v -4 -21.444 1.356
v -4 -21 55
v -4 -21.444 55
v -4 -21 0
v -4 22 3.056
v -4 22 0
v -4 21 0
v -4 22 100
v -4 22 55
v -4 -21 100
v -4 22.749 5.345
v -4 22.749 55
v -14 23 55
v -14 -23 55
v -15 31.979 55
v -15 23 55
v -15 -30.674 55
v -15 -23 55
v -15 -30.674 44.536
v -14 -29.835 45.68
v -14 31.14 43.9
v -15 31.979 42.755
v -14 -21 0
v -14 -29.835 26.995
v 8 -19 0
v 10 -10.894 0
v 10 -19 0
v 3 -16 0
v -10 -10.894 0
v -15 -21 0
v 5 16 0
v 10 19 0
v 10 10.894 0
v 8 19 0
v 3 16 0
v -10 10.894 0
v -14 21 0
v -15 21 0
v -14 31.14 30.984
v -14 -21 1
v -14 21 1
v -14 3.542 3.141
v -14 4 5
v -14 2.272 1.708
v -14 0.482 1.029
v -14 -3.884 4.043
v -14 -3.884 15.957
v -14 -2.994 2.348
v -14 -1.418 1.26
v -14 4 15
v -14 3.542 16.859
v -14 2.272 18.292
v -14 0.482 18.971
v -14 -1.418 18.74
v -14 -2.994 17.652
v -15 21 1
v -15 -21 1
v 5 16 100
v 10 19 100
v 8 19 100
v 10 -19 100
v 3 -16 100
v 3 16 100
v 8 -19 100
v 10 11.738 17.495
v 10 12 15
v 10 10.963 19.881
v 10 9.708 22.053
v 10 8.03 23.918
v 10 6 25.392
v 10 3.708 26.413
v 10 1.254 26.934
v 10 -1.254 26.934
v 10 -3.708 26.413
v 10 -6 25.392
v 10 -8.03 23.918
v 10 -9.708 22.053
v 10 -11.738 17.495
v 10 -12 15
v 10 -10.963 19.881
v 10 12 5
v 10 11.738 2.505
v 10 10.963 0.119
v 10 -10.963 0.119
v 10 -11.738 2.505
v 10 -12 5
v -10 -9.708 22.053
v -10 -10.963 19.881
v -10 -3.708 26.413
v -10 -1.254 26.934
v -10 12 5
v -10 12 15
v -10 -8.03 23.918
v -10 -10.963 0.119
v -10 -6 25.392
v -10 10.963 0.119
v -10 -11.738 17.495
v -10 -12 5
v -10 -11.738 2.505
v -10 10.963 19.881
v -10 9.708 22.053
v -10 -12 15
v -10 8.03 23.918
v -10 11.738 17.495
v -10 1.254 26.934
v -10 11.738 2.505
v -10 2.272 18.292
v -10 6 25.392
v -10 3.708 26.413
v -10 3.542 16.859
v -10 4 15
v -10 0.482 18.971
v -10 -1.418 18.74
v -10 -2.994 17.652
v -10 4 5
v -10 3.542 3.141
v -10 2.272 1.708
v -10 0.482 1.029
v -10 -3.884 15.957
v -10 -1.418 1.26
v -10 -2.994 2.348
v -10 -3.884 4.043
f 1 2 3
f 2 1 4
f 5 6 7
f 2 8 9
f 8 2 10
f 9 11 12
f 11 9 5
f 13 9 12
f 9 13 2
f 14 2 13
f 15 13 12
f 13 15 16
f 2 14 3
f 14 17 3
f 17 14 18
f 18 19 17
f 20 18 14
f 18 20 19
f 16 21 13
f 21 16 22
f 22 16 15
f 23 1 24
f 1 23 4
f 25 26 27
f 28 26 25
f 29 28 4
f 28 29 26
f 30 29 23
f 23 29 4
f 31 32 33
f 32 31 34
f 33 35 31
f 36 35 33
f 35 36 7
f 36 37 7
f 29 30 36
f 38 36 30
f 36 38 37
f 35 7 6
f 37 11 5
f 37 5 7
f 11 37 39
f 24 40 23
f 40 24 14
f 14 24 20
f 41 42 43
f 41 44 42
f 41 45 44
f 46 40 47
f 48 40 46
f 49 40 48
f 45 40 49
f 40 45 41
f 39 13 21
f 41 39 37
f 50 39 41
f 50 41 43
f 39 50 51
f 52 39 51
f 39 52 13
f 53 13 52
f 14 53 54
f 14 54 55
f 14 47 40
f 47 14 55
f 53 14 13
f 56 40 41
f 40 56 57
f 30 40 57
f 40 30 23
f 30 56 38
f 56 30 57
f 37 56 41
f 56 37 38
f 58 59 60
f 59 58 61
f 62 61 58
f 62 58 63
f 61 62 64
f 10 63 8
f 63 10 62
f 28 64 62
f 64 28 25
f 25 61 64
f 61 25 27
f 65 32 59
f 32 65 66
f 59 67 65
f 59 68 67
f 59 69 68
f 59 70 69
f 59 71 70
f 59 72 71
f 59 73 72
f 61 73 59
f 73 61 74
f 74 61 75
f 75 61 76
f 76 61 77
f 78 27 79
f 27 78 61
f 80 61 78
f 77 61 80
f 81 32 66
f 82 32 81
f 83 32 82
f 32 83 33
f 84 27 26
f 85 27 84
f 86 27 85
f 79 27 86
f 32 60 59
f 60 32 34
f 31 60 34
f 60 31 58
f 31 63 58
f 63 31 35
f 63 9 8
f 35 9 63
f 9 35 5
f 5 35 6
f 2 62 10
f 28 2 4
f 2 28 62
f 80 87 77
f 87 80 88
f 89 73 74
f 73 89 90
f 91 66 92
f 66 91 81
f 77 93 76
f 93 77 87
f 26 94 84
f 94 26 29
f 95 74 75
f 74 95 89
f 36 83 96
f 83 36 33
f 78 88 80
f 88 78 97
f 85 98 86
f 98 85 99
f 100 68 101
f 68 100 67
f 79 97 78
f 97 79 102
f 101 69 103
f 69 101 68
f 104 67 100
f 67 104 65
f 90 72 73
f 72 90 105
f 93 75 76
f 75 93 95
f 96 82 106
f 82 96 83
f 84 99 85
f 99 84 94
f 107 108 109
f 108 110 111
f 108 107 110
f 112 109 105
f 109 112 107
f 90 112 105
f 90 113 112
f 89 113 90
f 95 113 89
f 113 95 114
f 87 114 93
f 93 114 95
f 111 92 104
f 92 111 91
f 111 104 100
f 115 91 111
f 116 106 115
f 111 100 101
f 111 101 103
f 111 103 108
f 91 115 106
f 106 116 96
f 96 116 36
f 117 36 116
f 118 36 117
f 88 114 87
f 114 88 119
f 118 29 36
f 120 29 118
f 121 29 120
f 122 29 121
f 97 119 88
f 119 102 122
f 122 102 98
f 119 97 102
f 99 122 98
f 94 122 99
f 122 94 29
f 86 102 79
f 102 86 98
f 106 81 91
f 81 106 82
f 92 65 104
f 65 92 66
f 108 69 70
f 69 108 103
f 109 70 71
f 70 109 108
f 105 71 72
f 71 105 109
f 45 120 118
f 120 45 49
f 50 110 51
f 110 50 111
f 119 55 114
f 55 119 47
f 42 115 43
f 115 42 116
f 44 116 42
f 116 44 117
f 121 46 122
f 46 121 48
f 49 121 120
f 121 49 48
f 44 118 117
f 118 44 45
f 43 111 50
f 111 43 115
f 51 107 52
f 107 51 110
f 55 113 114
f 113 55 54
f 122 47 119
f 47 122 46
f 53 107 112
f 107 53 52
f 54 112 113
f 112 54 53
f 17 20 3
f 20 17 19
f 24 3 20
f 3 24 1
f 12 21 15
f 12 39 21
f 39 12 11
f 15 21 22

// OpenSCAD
arca =[[35,8],[35,10],[38,13],[38,15],[0,15],[0,13],[3,8],[3,8],[-2,1],[0,1],[1,1],[40,1],[41,1]];

fitting=[[0,15],[0,0],[5,0],[5,13],[6,15]];

tp = [
  [0, 1],
  [1, 0]
];
base1 = 100;
base2 = 42+6-.7;//84mm + 6mm for width of mount-.2 rounding?
union() 
{
     difference()
//   union()
    {
        union() 
        {
            translate([-4, -21, 0])
                rotate([ 0,-90, 0])
            union()
            {
                linear_extrude(height = 11)
                    polygon([[40,-13],[55,-2],[55,-18]]);
                linear_extrude(height = 11)
                    polygon([[40,55],[55,44],[55,60]]);
                linear_extrude(height = 10)               
                    polygon([[55,-18],[55,60],[0,42],[0,0]]);
                linear_extrude(height = 11)
                    polygon([[0,42],[0,0],[1,0],[1,42]]);
            }
             translate([-5,-19,  0])
                linear_extrude(height = base1)
                    polygon(points = arca * tp);
         }
                     translate([20, 0, 10])
           rotate([ -90,0, 0])
     union()
            {
                cutout(30,12,10);
                translate([-20, 0, 0])
                    cutout(15,4,10);
//                    translate([0, 3, -10])                
//                        cutout(10,12,10);

                rotate([ 0,-40, 0])
                    translate([-80, 0, -11])                   
                        cube([100,100,20], center=true);
                rotate([ 0,40, 0])
                    translate([-80, 0, 12])  
                        cube([100,100,20], center=true);
            };

  };
};
module cutout(h1,r1,w)
{
    rotate([0, -90, 0])
    hull()
    {
        translate([0, w/2,0 ])   
            cylinder(h=h1,r=r1);
        translate([0, -w/2,0 ])    
            cylinder(h=h1,r=r1);
    };
};
